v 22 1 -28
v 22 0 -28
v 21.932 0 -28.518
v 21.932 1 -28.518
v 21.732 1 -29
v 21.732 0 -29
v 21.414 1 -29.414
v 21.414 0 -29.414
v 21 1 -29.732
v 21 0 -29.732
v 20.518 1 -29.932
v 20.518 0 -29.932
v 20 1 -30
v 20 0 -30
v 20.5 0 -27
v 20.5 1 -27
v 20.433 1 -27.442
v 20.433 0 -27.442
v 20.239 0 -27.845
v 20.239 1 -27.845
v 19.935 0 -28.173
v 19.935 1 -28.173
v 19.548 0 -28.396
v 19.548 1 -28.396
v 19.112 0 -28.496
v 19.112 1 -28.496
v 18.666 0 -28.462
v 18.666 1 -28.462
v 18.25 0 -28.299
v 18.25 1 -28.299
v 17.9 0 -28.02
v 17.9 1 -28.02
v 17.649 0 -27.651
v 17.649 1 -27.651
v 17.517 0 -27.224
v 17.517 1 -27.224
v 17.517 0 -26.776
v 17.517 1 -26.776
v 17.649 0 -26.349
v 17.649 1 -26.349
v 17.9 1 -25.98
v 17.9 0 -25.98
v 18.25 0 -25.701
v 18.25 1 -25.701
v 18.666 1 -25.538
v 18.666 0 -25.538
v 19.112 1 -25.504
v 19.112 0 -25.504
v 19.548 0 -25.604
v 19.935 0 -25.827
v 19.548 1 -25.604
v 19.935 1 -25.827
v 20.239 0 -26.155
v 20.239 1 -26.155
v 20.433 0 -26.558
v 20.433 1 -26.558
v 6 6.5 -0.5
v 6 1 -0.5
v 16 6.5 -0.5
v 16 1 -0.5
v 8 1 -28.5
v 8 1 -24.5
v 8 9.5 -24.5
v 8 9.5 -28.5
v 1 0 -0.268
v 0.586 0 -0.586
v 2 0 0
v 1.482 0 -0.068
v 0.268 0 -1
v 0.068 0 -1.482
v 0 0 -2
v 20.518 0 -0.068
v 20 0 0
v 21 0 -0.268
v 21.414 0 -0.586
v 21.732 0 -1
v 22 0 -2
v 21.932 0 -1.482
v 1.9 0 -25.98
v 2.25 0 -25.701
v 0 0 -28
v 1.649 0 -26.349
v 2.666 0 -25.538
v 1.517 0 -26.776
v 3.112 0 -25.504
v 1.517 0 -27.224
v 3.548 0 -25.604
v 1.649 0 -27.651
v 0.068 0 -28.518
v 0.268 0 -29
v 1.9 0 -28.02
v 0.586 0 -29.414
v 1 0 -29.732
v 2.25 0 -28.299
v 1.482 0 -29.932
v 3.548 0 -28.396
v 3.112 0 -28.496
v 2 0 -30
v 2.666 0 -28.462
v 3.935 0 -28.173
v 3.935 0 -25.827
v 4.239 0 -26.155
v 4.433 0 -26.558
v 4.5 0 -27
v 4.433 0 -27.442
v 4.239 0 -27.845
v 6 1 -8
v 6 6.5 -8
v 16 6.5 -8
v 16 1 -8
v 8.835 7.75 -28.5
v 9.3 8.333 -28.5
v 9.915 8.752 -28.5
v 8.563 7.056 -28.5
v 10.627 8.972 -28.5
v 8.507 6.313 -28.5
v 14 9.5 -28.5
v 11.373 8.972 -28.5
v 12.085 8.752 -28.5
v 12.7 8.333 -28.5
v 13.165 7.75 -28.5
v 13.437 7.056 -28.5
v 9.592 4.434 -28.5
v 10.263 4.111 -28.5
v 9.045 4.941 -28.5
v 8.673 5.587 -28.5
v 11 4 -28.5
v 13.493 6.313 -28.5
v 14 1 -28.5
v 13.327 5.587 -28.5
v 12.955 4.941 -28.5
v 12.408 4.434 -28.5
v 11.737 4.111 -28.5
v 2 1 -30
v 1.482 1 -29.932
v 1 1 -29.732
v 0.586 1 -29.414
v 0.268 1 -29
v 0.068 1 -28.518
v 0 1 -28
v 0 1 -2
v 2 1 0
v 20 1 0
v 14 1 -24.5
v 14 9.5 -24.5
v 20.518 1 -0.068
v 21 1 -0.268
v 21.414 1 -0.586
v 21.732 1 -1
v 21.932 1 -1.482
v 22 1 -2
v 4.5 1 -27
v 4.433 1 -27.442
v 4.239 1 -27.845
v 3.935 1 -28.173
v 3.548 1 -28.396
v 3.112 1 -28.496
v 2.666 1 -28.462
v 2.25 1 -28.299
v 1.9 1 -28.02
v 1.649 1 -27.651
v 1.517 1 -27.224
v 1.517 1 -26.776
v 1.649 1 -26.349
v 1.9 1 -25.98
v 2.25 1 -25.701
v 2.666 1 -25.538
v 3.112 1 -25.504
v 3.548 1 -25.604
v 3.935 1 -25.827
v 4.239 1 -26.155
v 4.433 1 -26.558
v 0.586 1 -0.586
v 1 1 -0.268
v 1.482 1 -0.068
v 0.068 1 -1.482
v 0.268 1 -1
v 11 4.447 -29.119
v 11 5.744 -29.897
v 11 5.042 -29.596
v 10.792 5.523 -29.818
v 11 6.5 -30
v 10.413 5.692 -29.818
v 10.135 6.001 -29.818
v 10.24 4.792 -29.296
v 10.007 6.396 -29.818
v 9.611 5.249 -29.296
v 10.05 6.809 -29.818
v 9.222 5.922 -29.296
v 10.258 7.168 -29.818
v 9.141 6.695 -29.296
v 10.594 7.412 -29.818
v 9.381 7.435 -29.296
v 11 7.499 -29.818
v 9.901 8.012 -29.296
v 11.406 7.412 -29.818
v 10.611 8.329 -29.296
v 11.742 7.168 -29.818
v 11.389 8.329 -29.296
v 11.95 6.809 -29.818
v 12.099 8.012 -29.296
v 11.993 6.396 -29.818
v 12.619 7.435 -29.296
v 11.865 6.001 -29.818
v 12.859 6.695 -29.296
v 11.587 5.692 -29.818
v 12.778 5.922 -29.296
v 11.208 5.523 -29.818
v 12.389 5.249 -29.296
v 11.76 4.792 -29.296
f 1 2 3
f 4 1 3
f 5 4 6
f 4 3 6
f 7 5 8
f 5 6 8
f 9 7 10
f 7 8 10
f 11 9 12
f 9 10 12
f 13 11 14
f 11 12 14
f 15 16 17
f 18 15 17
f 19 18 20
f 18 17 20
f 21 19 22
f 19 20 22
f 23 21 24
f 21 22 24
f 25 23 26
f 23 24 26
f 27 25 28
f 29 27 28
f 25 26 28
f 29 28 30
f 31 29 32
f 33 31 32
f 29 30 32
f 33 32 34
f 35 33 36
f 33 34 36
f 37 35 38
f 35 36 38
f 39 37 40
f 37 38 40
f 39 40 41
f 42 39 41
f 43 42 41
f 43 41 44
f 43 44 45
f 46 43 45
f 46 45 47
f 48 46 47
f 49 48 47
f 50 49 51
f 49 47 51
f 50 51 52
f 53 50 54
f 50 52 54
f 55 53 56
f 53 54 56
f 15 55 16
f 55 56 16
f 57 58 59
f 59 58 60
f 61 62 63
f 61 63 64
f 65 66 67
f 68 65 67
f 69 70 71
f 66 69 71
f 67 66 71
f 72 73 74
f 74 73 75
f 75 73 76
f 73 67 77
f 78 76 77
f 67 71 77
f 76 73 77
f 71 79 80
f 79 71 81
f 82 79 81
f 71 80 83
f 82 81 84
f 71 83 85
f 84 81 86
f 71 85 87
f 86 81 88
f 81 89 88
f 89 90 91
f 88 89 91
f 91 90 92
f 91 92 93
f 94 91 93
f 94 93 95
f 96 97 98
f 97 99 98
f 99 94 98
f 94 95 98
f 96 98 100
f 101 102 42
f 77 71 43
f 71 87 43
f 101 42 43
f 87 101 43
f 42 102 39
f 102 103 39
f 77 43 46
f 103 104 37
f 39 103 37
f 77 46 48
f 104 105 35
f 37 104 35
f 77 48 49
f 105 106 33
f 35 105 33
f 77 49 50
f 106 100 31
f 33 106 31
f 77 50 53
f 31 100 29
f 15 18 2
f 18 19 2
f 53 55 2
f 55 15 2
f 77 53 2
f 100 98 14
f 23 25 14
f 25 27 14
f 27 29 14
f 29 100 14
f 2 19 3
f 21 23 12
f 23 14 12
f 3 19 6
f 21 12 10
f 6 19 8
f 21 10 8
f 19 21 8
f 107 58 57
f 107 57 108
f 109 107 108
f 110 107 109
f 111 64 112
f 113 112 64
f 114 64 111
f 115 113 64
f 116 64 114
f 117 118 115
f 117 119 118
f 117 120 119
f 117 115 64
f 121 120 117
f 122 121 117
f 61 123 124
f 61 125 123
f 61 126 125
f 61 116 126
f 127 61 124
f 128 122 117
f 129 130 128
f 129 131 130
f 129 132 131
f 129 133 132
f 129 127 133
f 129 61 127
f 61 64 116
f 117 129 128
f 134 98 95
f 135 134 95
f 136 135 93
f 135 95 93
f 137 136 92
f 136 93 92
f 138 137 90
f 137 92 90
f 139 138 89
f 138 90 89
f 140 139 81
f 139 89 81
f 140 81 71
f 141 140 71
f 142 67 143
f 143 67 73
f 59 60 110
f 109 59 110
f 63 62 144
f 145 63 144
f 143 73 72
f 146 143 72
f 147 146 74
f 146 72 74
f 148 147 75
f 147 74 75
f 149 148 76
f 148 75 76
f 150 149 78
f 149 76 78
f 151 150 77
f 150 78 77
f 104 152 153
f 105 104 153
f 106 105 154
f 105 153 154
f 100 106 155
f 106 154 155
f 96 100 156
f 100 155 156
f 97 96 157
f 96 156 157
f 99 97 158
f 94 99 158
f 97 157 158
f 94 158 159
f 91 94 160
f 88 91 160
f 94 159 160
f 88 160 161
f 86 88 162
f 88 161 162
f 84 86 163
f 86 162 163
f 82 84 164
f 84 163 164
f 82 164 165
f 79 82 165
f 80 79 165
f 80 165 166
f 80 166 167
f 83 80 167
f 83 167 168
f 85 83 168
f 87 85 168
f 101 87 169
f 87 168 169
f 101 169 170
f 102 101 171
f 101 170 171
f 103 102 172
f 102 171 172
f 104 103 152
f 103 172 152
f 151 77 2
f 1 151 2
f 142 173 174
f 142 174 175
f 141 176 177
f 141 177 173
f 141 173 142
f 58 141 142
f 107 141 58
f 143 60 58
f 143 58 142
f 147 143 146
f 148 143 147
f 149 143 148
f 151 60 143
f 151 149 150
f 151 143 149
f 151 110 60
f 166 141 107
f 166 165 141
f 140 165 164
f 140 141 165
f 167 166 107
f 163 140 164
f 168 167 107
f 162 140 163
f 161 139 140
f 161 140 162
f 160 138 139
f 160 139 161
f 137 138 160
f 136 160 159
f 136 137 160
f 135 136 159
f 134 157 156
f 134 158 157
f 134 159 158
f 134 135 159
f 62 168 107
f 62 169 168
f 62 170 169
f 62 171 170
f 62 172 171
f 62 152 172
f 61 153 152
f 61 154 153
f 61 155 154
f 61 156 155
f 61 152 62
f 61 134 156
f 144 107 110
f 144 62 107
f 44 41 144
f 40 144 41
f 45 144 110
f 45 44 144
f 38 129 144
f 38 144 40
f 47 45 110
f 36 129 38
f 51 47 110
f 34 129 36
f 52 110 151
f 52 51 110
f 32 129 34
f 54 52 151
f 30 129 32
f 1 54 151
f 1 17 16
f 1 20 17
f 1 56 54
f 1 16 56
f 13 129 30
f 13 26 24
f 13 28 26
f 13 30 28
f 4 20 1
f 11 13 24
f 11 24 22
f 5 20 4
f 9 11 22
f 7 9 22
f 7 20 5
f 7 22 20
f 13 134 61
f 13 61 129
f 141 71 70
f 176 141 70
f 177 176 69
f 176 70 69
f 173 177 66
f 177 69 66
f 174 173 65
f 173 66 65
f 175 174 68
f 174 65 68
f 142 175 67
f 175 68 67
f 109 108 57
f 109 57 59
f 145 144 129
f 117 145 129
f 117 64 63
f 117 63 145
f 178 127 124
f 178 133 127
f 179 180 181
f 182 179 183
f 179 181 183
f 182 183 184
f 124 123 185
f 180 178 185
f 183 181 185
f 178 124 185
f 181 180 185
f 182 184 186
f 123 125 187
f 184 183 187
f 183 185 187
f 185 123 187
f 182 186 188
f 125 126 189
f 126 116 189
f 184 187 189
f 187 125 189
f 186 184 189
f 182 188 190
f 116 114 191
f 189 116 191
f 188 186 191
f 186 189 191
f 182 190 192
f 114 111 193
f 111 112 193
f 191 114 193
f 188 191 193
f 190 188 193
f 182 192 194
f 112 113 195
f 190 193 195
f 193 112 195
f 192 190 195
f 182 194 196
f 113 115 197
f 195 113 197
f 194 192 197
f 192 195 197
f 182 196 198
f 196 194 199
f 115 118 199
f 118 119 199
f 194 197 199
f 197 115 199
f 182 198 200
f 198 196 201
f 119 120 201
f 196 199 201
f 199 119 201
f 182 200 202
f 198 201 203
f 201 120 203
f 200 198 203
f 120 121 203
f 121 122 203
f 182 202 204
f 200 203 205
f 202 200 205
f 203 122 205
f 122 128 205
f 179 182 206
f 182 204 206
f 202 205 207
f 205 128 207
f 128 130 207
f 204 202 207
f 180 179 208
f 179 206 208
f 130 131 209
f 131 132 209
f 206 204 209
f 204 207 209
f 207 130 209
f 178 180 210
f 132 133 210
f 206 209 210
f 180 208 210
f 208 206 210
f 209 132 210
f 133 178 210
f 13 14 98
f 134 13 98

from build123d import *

# Parameters (mm, degrees)
BOSS_EXTRU_1_DEPTH      = 1
ESQUISSE3_R             = 1.5
ENL_V_MAT_EXTRU_1_DEPTH = 1
ESQUISSE4_W             = 6
ESQUISSE4_H             = 4
BOSS_EXTRU_2_DEPTH      = 8.5
ESQUISSE7_W             = 10
ESQUISSE7_H             = 7.5
BOSS_EXTRU_4_DEPTH      = 5.5


with BuildPart() as part:
    # Esquisse1 → Boss.-Extru.1 (new body)
    with BuildSketch(Plane(origin=(0, 0, 0), x_dir=(1, 0, 0), z_dir=(0, 1, 0))):
        with BuildLine():
            Line((2, 0), (20, 0))
            ThreePointArc((20, 0), (21.414213562, 0.585786438), (22, 2))
            Line((22, 2), (22, 28))
            ThreePointArc((22, 28), (21.414213562, 29.414213562), (20, 30))
            Line((20, 30), (2, 30))
            ThreePointArc((2, 30), (0.585786438, 29.414213562), (0, 28))
            Line((0, 28), (0, 2))
            ThreePointArc((0, 2), (0.585786438, 0.585786438), (2, 0))
        make_face()
    extrude(amount=BOSS_EXTRU_1_DEPTH)

    # Esquisse3 → Enlèv. mat.-Extru.1 (cut)
    with BuildSketch(Plane(origin=(0, 1, 0), x_dir=(1, 0, 0), z_dir=(0, 1, 0))):
        with Locations((3, 27)):
            Circle(ESQUISSE3_R)
        with Locations((19, 27)):
            Circle(ESQUISSE3_R)
    extrude(amount=-ENL_V_MAT_EXTRU_1_DEPTH, mode=Mode.SUBTRACT)

    # Esquisse4 → Boss.-Extru.2 (add)
    with BuildSketch(Plane(origin=(0, 1, 0), x_dir=(1, 0, 0), z_dir=(0, 1, 0))):
        with Locations((11, 26.5)):
            Rectangle(ESQUISSE4_W, ESQUISSE4_H)
    extrude(amount=BOSS_EXTRU_2_DEPTH)

    # Esquisse6 → Révolution1 (revolve)
    with BuildSketch(Plane(origin=(11, 0, 0), x_dir=(0, 0, -1), z_dir=(1, 0, 0))):
        with BuildLine():
            Line((28.5, 6.5), (30, 6.5))
            ThreePointArc((30, 6.5), (29.596229956, 5.042262026), (28.5, 4))
            Line((28.5, 4), (28.5, 6.5))
        make_face()
    revolve(axis=Axis((11, 6.5, -28.5), (0, 0, -1)))

    # Esquisse7 → Boss.-Extru.4 (add)
    with BuildSketch(Plane(origin=(0, 1, 0), x_dir=(1, 0, 0), z_dir=(0, 1, 0))):
        with Locations((11, 4.25)):
            Rectangle(ESQUISSE7_W, ESQUISSE7_H)
    extrude(amount=BOSS_EXTRU_4_DEPTH)


solid = part.part
